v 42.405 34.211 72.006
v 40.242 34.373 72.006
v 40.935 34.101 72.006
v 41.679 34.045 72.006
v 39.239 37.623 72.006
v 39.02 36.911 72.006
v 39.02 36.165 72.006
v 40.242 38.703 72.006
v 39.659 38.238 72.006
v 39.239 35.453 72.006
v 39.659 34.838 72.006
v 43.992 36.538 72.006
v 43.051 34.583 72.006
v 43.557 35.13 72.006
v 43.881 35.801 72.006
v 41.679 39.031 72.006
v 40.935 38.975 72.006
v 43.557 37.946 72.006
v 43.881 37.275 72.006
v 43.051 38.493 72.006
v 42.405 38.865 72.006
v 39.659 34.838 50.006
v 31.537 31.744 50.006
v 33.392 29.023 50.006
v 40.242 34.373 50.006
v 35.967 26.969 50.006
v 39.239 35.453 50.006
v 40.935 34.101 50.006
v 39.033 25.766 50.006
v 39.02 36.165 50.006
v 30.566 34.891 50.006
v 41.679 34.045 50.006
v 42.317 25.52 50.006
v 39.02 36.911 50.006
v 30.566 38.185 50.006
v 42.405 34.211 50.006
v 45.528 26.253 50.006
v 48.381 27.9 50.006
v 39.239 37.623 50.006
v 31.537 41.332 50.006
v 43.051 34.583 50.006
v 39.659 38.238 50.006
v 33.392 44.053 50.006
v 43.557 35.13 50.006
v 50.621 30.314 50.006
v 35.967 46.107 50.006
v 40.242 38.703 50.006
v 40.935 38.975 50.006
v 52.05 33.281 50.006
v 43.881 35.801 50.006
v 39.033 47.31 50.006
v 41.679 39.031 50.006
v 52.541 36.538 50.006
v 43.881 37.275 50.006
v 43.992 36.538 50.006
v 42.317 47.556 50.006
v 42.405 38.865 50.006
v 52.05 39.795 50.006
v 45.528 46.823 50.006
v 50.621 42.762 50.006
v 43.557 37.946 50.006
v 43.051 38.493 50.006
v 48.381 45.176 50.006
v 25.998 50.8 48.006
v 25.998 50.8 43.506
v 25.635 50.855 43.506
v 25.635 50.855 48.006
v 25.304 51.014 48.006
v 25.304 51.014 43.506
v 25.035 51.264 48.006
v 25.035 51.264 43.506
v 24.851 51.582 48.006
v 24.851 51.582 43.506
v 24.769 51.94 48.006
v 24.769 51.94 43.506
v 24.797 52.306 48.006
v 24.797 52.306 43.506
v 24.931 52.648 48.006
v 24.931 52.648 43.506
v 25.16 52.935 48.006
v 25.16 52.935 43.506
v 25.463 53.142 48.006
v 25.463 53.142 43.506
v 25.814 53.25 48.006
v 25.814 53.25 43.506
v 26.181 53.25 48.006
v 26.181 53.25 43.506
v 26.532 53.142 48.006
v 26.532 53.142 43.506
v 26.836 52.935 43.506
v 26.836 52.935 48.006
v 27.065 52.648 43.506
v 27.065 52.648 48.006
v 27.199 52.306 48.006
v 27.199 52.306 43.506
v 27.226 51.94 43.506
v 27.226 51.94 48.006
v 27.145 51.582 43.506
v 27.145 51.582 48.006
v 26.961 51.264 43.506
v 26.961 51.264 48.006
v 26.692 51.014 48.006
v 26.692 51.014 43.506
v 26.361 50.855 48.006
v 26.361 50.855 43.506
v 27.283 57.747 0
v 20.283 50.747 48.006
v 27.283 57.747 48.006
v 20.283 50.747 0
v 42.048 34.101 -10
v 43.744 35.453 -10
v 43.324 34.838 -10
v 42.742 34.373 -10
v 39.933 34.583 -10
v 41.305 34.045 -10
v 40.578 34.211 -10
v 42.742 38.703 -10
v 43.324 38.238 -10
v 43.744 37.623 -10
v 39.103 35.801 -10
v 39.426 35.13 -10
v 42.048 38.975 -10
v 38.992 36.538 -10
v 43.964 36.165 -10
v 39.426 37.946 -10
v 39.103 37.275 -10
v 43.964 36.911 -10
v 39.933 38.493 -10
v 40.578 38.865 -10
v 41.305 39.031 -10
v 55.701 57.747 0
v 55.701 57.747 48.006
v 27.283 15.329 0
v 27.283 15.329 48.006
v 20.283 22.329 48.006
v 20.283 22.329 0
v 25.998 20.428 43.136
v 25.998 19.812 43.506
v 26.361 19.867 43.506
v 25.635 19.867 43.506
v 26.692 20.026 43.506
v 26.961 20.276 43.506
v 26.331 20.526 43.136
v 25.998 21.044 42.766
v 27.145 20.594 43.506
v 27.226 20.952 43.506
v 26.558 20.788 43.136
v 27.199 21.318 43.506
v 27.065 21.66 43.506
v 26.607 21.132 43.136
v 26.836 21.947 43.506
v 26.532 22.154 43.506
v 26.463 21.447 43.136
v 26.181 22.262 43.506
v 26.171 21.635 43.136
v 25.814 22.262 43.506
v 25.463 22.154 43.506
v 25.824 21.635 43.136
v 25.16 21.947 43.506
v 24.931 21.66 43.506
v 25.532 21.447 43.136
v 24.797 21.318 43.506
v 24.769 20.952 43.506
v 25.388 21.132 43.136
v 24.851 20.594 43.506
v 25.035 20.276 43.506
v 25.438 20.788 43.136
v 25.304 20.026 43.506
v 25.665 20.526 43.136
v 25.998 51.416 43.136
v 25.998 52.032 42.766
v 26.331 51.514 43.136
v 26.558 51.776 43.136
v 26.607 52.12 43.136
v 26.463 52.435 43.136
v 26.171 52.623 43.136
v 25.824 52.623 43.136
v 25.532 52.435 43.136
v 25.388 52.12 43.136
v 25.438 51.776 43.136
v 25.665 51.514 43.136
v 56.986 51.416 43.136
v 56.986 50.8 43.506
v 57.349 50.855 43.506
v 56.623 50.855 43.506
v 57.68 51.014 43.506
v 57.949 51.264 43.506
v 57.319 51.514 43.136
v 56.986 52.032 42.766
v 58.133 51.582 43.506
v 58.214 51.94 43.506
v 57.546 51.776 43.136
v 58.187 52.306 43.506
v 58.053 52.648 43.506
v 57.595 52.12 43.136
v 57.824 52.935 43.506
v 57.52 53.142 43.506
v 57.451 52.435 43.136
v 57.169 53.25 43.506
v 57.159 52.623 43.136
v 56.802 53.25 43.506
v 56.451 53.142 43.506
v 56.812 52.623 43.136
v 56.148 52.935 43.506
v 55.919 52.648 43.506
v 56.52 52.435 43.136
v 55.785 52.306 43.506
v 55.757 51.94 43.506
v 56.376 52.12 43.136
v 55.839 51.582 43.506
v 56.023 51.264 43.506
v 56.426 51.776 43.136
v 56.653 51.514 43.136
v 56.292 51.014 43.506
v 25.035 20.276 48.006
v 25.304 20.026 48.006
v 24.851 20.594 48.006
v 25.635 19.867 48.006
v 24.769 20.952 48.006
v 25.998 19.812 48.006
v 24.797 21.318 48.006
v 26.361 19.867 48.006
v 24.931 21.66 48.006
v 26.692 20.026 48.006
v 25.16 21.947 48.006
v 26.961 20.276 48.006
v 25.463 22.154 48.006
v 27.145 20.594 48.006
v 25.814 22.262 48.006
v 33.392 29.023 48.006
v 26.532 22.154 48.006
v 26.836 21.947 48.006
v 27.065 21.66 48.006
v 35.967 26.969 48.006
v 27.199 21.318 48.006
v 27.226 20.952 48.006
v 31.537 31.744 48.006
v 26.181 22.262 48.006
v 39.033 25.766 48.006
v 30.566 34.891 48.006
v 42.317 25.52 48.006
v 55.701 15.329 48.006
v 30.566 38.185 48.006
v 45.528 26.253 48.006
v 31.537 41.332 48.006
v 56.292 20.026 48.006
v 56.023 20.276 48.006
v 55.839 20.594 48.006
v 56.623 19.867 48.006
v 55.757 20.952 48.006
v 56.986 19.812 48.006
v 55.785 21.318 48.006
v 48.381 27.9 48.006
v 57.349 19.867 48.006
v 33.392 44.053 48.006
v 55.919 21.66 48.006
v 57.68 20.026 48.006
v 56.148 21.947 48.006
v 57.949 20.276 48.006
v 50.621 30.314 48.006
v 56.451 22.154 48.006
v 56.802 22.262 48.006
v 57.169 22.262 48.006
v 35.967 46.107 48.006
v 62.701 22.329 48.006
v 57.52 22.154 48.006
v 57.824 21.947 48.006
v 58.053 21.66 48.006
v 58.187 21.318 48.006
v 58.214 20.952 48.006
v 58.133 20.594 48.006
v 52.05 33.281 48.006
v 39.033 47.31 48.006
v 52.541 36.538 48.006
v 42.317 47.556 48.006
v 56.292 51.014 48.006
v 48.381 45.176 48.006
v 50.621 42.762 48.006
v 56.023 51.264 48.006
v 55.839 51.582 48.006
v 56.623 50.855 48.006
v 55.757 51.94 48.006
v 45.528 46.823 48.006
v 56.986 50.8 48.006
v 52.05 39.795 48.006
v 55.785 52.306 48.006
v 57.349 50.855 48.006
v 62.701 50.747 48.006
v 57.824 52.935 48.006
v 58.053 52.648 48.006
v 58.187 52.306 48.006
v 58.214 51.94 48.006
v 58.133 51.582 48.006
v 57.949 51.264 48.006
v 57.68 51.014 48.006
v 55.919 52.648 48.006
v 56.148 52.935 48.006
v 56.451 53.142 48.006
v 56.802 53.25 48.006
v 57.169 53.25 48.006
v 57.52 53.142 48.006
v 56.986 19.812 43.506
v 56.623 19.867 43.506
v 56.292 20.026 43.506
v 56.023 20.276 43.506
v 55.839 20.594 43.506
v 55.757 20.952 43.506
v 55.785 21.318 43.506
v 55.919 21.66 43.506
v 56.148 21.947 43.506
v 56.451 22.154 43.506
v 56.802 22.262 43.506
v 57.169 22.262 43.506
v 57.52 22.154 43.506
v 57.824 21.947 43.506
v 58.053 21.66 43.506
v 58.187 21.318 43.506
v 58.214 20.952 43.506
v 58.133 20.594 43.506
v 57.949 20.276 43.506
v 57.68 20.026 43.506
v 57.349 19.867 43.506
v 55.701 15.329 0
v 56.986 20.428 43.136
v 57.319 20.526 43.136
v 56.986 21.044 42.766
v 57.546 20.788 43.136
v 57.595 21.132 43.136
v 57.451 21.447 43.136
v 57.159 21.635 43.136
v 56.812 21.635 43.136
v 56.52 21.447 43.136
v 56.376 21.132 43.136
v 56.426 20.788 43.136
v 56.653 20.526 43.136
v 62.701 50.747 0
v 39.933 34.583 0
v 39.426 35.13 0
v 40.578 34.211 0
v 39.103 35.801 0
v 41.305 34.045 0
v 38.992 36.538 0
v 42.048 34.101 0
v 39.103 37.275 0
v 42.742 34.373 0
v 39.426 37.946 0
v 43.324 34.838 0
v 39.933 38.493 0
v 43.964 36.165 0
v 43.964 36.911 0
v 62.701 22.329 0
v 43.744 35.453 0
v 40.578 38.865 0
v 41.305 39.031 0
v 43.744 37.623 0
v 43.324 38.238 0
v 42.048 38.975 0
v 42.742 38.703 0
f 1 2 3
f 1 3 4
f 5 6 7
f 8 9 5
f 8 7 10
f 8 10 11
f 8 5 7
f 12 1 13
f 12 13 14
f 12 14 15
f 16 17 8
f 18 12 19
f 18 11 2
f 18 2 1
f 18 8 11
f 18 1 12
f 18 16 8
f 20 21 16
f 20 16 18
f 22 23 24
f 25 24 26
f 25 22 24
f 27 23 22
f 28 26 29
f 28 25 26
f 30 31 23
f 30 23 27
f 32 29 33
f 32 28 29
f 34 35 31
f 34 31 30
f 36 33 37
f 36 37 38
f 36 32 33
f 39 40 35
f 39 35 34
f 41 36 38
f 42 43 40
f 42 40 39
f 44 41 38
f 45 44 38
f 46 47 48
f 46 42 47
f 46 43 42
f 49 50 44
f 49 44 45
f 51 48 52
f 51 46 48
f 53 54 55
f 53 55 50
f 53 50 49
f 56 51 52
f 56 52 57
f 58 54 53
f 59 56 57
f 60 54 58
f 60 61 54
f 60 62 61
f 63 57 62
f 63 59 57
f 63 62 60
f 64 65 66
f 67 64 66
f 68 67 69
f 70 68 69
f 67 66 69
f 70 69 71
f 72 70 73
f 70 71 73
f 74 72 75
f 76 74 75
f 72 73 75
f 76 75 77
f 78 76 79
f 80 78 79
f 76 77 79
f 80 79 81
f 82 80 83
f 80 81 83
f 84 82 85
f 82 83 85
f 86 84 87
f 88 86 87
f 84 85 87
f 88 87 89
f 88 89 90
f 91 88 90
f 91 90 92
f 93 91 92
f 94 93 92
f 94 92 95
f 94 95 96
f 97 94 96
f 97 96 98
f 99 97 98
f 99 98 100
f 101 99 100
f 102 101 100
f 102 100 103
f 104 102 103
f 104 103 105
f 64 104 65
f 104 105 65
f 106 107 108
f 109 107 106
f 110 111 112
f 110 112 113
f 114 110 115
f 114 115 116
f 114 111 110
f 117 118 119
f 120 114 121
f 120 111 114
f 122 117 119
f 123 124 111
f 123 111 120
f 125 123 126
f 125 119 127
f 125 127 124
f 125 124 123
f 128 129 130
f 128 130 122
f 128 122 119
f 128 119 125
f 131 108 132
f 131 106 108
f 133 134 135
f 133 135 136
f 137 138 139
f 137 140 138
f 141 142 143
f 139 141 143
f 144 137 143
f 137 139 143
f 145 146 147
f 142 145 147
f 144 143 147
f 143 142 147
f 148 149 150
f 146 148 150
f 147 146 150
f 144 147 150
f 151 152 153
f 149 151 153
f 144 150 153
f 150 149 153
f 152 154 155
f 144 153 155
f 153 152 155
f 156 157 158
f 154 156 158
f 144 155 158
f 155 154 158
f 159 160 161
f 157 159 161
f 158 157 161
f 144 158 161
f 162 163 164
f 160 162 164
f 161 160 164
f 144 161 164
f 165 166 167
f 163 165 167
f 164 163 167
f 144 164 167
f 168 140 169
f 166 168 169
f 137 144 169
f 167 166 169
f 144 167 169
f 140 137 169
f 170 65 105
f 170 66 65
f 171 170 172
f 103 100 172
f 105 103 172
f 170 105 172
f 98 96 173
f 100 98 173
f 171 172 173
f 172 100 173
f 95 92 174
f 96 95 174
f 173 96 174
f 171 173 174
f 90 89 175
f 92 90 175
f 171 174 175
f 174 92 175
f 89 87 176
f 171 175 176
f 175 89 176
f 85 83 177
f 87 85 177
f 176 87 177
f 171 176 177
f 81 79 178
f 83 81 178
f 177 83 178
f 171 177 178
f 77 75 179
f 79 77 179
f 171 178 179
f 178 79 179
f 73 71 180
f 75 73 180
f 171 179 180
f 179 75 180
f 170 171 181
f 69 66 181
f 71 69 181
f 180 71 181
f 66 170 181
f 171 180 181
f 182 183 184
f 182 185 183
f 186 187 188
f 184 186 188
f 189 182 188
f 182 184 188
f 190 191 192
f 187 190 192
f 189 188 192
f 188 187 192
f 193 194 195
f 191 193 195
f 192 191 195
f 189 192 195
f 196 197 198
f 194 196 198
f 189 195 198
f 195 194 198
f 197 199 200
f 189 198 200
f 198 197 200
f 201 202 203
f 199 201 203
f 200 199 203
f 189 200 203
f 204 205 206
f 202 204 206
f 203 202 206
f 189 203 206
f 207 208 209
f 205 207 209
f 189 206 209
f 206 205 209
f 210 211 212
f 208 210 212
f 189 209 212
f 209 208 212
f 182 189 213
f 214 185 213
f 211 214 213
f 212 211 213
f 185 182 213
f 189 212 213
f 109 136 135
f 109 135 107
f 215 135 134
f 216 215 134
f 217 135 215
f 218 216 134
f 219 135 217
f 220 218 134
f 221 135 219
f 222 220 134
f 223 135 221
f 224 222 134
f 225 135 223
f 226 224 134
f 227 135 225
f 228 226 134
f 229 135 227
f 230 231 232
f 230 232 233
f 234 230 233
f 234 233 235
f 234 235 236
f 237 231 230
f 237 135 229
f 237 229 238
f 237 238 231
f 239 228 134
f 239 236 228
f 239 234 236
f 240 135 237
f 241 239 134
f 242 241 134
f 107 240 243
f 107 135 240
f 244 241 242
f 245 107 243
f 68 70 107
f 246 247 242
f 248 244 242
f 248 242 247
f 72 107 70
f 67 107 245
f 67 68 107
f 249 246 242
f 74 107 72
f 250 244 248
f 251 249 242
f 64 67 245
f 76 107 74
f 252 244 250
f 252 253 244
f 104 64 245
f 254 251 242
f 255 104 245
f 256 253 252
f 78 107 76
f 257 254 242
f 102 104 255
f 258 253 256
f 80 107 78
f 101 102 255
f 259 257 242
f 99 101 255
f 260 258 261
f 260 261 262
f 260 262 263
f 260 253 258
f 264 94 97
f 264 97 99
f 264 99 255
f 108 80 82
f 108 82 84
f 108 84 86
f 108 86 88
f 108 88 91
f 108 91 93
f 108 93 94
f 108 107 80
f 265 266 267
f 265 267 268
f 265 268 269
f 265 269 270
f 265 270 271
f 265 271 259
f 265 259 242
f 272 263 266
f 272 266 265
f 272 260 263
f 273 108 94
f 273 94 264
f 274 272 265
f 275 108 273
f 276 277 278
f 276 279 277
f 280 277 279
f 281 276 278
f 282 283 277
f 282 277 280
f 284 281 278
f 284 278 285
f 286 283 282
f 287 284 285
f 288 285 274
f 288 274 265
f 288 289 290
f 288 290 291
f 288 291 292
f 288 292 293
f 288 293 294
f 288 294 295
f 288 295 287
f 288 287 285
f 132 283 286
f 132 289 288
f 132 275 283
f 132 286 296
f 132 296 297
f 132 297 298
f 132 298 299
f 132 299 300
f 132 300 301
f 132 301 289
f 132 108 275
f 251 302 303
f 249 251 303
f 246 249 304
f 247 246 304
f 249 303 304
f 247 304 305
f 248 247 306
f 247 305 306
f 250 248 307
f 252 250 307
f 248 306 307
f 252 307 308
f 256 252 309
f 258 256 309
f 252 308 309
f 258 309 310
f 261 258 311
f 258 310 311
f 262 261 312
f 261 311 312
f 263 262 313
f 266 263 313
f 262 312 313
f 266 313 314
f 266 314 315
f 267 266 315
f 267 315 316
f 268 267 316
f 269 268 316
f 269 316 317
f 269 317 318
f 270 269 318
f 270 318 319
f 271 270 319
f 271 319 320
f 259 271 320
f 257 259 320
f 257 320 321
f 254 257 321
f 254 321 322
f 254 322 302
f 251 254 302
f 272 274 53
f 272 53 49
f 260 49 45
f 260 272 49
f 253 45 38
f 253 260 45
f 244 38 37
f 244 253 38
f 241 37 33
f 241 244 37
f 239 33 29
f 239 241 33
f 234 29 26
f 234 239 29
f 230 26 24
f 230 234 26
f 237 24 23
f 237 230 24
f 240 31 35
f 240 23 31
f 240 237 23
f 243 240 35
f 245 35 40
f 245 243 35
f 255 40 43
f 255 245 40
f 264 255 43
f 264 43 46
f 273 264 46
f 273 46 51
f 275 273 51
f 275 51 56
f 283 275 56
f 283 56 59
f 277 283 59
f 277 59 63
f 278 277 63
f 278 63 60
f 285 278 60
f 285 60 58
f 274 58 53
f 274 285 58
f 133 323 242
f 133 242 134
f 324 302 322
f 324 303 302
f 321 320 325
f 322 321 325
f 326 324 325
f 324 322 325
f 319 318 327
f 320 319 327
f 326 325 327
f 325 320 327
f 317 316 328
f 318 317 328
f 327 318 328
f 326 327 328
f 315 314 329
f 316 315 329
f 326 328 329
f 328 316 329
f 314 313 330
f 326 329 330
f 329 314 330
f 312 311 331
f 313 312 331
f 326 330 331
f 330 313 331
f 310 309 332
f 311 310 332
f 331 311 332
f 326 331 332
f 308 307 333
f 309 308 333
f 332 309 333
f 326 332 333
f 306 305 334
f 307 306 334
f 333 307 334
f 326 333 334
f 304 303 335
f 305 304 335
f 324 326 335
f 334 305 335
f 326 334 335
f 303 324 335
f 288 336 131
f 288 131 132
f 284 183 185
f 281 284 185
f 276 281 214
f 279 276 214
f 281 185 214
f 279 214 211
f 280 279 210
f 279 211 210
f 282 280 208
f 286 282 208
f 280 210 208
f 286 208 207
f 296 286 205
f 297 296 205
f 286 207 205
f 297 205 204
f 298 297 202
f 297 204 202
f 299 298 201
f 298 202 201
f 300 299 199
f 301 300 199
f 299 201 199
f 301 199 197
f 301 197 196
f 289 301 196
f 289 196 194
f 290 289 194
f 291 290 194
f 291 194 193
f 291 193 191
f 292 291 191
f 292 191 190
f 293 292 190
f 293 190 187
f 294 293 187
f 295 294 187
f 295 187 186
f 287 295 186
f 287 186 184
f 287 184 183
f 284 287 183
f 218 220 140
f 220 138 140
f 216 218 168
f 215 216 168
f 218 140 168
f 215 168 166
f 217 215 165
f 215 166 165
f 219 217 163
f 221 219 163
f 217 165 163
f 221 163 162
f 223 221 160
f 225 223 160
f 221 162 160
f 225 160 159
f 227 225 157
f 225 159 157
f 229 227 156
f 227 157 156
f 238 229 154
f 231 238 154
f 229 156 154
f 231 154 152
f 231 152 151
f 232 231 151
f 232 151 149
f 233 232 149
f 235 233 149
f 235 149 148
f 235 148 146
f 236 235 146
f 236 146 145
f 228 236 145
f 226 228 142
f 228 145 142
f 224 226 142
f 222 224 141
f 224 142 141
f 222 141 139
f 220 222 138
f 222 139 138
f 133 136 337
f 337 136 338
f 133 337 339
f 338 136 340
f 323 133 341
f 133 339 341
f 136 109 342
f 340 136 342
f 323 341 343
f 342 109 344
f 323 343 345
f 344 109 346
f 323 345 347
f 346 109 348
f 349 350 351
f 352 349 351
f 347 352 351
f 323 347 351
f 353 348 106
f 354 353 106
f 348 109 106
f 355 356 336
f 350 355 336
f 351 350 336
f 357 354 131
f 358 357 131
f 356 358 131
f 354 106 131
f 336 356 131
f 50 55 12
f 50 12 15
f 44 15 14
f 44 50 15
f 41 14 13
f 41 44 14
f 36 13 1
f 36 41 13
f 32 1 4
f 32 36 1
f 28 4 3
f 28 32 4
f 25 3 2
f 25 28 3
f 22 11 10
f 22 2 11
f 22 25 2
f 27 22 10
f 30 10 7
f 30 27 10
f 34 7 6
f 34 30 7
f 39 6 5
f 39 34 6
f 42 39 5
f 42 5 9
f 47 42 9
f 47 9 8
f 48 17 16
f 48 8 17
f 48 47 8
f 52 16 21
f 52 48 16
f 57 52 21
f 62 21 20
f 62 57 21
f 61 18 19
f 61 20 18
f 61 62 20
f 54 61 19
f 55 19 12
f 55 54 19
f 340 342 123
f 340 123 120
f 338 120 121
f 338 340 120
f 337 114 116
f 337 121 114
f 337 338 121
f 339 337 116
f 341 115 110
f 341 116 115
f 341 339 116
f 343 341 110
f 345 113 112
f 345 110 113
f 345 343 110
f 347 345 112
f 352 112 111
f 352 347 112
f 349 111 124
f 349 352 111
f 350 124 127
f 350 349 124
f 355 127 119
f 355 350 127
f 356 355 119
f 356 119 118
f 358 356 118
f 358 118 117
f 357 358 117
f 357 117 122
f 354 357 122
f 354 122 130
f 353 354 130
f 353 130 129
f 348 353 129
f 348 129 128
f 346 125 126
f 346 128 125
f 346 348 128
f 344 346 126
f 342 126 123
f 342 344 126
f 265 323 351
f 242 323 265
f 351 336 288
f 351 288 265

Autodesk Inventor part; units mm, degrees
ref_plane "YZ Plane" through (0, 0, 0) normal (1, 0, 0) x (0, 1, 0)
ref_plane "XZ Plane" through (0, 0, 0) normal (0, 1, 0) x (-1, 0, 0)
ref_plane "XY Plane" through (0, 0, 0) normal (0, 0, 1) x (1, 0, 0)
sketch "Sketch1" plane through (0, 0, 0) normal (0, 0, 1) x (1, 0, 0)
  line L0 (20.2828, 57.747) -> (62.7008, 57.747)
  line L1 (62.7008, 57.747) -> (62.7008, 15.329)
  line L2 (62.7008, 15.329) -> (20.2828, 15.329)
  line L3 (20.2828, 15.329) -> (20.2828, 57.747)
  dimension "d0" = 42.418
  dimension "d1" = 42.418
extrude "Extrusion1" add sketch "Sketch1" along normal blind 48.006
sketch "Sketch2" plane through (0, 0, 48.006) normal (0, 0, 1) x (1, 0, 0)
  line L0 (20.2828, 57.747) -> (62.7008, 57.747) projected
  line L1 (20.2828, 15.329) -> (20.2828, 57.747) projected
  circle A0 centre (25.9978, 52.032) radius 1.5
  dimension "d4" = 3
  dimension "d5" = 5.715
  dimension "d6" = 5.715
hole "Hole1" at (25.9978, 52.032, 48.006) direction (0, 0, -1) diameter 2.4638 depth 4.5 tip angle 118
pattern_linear "Rectangular Pattern1" count 2 spacing 30.988 along (1, 0, 0) count 2 spacing 30.988 along (0, -1, 0) of "Hole1"
sketch "Sketch3" plane through (0, 0, 48.006) normal (0, 0, 1) x (1, 0, 0)
  circle A0 centre (41.4918, 36.538) radius 11.049
  dimension "d20" = 22.098
extrude "Extrusion2" add sketch "Sketch3" along normal blind 2
sketch "Sketch4" plane through (41.4918, 36.538, 50.006) normal (0, 0, 1) x (1, 0, 0)
  circle A0 centre (0, 0) radius 11.049 projected
  circle A1 centre (0, 0) radius 2.5
  dimension "d23" = 5
extrude "Extrusion3" add sketch "Sketch4" along normal blind 22 contours A1
chamfer "Chamfer1" distance 7 angle 45 4 edges at (62.7008, 57.747, 24.003) (20.2828, 57.747, 24.003) (20.2828, 15.329, 24.003) (62.7008, 15.329, 24.003)
sketch "Sketch5" plane through (0, 0, 0) normal (0, 0, -1) x (-1, 0, 0)
  line L0 (-27.2828, 57.747) -> (-55.7008, 57.747) projected
  line L1 (-62.7008, 50.747) -> (-62.7008, 22.329) projected
  circle A0 centre (-41.4918, 36.538) radius 2.5
  dimension "d29" = 5
  dimension "d30" = 21.209
  dimension "d31" = 21.209
extrude "Extrusion4" add sketch "Sketch5" along normal blind 10
properties part number "SM-E01" material "Aluminum-6061"
